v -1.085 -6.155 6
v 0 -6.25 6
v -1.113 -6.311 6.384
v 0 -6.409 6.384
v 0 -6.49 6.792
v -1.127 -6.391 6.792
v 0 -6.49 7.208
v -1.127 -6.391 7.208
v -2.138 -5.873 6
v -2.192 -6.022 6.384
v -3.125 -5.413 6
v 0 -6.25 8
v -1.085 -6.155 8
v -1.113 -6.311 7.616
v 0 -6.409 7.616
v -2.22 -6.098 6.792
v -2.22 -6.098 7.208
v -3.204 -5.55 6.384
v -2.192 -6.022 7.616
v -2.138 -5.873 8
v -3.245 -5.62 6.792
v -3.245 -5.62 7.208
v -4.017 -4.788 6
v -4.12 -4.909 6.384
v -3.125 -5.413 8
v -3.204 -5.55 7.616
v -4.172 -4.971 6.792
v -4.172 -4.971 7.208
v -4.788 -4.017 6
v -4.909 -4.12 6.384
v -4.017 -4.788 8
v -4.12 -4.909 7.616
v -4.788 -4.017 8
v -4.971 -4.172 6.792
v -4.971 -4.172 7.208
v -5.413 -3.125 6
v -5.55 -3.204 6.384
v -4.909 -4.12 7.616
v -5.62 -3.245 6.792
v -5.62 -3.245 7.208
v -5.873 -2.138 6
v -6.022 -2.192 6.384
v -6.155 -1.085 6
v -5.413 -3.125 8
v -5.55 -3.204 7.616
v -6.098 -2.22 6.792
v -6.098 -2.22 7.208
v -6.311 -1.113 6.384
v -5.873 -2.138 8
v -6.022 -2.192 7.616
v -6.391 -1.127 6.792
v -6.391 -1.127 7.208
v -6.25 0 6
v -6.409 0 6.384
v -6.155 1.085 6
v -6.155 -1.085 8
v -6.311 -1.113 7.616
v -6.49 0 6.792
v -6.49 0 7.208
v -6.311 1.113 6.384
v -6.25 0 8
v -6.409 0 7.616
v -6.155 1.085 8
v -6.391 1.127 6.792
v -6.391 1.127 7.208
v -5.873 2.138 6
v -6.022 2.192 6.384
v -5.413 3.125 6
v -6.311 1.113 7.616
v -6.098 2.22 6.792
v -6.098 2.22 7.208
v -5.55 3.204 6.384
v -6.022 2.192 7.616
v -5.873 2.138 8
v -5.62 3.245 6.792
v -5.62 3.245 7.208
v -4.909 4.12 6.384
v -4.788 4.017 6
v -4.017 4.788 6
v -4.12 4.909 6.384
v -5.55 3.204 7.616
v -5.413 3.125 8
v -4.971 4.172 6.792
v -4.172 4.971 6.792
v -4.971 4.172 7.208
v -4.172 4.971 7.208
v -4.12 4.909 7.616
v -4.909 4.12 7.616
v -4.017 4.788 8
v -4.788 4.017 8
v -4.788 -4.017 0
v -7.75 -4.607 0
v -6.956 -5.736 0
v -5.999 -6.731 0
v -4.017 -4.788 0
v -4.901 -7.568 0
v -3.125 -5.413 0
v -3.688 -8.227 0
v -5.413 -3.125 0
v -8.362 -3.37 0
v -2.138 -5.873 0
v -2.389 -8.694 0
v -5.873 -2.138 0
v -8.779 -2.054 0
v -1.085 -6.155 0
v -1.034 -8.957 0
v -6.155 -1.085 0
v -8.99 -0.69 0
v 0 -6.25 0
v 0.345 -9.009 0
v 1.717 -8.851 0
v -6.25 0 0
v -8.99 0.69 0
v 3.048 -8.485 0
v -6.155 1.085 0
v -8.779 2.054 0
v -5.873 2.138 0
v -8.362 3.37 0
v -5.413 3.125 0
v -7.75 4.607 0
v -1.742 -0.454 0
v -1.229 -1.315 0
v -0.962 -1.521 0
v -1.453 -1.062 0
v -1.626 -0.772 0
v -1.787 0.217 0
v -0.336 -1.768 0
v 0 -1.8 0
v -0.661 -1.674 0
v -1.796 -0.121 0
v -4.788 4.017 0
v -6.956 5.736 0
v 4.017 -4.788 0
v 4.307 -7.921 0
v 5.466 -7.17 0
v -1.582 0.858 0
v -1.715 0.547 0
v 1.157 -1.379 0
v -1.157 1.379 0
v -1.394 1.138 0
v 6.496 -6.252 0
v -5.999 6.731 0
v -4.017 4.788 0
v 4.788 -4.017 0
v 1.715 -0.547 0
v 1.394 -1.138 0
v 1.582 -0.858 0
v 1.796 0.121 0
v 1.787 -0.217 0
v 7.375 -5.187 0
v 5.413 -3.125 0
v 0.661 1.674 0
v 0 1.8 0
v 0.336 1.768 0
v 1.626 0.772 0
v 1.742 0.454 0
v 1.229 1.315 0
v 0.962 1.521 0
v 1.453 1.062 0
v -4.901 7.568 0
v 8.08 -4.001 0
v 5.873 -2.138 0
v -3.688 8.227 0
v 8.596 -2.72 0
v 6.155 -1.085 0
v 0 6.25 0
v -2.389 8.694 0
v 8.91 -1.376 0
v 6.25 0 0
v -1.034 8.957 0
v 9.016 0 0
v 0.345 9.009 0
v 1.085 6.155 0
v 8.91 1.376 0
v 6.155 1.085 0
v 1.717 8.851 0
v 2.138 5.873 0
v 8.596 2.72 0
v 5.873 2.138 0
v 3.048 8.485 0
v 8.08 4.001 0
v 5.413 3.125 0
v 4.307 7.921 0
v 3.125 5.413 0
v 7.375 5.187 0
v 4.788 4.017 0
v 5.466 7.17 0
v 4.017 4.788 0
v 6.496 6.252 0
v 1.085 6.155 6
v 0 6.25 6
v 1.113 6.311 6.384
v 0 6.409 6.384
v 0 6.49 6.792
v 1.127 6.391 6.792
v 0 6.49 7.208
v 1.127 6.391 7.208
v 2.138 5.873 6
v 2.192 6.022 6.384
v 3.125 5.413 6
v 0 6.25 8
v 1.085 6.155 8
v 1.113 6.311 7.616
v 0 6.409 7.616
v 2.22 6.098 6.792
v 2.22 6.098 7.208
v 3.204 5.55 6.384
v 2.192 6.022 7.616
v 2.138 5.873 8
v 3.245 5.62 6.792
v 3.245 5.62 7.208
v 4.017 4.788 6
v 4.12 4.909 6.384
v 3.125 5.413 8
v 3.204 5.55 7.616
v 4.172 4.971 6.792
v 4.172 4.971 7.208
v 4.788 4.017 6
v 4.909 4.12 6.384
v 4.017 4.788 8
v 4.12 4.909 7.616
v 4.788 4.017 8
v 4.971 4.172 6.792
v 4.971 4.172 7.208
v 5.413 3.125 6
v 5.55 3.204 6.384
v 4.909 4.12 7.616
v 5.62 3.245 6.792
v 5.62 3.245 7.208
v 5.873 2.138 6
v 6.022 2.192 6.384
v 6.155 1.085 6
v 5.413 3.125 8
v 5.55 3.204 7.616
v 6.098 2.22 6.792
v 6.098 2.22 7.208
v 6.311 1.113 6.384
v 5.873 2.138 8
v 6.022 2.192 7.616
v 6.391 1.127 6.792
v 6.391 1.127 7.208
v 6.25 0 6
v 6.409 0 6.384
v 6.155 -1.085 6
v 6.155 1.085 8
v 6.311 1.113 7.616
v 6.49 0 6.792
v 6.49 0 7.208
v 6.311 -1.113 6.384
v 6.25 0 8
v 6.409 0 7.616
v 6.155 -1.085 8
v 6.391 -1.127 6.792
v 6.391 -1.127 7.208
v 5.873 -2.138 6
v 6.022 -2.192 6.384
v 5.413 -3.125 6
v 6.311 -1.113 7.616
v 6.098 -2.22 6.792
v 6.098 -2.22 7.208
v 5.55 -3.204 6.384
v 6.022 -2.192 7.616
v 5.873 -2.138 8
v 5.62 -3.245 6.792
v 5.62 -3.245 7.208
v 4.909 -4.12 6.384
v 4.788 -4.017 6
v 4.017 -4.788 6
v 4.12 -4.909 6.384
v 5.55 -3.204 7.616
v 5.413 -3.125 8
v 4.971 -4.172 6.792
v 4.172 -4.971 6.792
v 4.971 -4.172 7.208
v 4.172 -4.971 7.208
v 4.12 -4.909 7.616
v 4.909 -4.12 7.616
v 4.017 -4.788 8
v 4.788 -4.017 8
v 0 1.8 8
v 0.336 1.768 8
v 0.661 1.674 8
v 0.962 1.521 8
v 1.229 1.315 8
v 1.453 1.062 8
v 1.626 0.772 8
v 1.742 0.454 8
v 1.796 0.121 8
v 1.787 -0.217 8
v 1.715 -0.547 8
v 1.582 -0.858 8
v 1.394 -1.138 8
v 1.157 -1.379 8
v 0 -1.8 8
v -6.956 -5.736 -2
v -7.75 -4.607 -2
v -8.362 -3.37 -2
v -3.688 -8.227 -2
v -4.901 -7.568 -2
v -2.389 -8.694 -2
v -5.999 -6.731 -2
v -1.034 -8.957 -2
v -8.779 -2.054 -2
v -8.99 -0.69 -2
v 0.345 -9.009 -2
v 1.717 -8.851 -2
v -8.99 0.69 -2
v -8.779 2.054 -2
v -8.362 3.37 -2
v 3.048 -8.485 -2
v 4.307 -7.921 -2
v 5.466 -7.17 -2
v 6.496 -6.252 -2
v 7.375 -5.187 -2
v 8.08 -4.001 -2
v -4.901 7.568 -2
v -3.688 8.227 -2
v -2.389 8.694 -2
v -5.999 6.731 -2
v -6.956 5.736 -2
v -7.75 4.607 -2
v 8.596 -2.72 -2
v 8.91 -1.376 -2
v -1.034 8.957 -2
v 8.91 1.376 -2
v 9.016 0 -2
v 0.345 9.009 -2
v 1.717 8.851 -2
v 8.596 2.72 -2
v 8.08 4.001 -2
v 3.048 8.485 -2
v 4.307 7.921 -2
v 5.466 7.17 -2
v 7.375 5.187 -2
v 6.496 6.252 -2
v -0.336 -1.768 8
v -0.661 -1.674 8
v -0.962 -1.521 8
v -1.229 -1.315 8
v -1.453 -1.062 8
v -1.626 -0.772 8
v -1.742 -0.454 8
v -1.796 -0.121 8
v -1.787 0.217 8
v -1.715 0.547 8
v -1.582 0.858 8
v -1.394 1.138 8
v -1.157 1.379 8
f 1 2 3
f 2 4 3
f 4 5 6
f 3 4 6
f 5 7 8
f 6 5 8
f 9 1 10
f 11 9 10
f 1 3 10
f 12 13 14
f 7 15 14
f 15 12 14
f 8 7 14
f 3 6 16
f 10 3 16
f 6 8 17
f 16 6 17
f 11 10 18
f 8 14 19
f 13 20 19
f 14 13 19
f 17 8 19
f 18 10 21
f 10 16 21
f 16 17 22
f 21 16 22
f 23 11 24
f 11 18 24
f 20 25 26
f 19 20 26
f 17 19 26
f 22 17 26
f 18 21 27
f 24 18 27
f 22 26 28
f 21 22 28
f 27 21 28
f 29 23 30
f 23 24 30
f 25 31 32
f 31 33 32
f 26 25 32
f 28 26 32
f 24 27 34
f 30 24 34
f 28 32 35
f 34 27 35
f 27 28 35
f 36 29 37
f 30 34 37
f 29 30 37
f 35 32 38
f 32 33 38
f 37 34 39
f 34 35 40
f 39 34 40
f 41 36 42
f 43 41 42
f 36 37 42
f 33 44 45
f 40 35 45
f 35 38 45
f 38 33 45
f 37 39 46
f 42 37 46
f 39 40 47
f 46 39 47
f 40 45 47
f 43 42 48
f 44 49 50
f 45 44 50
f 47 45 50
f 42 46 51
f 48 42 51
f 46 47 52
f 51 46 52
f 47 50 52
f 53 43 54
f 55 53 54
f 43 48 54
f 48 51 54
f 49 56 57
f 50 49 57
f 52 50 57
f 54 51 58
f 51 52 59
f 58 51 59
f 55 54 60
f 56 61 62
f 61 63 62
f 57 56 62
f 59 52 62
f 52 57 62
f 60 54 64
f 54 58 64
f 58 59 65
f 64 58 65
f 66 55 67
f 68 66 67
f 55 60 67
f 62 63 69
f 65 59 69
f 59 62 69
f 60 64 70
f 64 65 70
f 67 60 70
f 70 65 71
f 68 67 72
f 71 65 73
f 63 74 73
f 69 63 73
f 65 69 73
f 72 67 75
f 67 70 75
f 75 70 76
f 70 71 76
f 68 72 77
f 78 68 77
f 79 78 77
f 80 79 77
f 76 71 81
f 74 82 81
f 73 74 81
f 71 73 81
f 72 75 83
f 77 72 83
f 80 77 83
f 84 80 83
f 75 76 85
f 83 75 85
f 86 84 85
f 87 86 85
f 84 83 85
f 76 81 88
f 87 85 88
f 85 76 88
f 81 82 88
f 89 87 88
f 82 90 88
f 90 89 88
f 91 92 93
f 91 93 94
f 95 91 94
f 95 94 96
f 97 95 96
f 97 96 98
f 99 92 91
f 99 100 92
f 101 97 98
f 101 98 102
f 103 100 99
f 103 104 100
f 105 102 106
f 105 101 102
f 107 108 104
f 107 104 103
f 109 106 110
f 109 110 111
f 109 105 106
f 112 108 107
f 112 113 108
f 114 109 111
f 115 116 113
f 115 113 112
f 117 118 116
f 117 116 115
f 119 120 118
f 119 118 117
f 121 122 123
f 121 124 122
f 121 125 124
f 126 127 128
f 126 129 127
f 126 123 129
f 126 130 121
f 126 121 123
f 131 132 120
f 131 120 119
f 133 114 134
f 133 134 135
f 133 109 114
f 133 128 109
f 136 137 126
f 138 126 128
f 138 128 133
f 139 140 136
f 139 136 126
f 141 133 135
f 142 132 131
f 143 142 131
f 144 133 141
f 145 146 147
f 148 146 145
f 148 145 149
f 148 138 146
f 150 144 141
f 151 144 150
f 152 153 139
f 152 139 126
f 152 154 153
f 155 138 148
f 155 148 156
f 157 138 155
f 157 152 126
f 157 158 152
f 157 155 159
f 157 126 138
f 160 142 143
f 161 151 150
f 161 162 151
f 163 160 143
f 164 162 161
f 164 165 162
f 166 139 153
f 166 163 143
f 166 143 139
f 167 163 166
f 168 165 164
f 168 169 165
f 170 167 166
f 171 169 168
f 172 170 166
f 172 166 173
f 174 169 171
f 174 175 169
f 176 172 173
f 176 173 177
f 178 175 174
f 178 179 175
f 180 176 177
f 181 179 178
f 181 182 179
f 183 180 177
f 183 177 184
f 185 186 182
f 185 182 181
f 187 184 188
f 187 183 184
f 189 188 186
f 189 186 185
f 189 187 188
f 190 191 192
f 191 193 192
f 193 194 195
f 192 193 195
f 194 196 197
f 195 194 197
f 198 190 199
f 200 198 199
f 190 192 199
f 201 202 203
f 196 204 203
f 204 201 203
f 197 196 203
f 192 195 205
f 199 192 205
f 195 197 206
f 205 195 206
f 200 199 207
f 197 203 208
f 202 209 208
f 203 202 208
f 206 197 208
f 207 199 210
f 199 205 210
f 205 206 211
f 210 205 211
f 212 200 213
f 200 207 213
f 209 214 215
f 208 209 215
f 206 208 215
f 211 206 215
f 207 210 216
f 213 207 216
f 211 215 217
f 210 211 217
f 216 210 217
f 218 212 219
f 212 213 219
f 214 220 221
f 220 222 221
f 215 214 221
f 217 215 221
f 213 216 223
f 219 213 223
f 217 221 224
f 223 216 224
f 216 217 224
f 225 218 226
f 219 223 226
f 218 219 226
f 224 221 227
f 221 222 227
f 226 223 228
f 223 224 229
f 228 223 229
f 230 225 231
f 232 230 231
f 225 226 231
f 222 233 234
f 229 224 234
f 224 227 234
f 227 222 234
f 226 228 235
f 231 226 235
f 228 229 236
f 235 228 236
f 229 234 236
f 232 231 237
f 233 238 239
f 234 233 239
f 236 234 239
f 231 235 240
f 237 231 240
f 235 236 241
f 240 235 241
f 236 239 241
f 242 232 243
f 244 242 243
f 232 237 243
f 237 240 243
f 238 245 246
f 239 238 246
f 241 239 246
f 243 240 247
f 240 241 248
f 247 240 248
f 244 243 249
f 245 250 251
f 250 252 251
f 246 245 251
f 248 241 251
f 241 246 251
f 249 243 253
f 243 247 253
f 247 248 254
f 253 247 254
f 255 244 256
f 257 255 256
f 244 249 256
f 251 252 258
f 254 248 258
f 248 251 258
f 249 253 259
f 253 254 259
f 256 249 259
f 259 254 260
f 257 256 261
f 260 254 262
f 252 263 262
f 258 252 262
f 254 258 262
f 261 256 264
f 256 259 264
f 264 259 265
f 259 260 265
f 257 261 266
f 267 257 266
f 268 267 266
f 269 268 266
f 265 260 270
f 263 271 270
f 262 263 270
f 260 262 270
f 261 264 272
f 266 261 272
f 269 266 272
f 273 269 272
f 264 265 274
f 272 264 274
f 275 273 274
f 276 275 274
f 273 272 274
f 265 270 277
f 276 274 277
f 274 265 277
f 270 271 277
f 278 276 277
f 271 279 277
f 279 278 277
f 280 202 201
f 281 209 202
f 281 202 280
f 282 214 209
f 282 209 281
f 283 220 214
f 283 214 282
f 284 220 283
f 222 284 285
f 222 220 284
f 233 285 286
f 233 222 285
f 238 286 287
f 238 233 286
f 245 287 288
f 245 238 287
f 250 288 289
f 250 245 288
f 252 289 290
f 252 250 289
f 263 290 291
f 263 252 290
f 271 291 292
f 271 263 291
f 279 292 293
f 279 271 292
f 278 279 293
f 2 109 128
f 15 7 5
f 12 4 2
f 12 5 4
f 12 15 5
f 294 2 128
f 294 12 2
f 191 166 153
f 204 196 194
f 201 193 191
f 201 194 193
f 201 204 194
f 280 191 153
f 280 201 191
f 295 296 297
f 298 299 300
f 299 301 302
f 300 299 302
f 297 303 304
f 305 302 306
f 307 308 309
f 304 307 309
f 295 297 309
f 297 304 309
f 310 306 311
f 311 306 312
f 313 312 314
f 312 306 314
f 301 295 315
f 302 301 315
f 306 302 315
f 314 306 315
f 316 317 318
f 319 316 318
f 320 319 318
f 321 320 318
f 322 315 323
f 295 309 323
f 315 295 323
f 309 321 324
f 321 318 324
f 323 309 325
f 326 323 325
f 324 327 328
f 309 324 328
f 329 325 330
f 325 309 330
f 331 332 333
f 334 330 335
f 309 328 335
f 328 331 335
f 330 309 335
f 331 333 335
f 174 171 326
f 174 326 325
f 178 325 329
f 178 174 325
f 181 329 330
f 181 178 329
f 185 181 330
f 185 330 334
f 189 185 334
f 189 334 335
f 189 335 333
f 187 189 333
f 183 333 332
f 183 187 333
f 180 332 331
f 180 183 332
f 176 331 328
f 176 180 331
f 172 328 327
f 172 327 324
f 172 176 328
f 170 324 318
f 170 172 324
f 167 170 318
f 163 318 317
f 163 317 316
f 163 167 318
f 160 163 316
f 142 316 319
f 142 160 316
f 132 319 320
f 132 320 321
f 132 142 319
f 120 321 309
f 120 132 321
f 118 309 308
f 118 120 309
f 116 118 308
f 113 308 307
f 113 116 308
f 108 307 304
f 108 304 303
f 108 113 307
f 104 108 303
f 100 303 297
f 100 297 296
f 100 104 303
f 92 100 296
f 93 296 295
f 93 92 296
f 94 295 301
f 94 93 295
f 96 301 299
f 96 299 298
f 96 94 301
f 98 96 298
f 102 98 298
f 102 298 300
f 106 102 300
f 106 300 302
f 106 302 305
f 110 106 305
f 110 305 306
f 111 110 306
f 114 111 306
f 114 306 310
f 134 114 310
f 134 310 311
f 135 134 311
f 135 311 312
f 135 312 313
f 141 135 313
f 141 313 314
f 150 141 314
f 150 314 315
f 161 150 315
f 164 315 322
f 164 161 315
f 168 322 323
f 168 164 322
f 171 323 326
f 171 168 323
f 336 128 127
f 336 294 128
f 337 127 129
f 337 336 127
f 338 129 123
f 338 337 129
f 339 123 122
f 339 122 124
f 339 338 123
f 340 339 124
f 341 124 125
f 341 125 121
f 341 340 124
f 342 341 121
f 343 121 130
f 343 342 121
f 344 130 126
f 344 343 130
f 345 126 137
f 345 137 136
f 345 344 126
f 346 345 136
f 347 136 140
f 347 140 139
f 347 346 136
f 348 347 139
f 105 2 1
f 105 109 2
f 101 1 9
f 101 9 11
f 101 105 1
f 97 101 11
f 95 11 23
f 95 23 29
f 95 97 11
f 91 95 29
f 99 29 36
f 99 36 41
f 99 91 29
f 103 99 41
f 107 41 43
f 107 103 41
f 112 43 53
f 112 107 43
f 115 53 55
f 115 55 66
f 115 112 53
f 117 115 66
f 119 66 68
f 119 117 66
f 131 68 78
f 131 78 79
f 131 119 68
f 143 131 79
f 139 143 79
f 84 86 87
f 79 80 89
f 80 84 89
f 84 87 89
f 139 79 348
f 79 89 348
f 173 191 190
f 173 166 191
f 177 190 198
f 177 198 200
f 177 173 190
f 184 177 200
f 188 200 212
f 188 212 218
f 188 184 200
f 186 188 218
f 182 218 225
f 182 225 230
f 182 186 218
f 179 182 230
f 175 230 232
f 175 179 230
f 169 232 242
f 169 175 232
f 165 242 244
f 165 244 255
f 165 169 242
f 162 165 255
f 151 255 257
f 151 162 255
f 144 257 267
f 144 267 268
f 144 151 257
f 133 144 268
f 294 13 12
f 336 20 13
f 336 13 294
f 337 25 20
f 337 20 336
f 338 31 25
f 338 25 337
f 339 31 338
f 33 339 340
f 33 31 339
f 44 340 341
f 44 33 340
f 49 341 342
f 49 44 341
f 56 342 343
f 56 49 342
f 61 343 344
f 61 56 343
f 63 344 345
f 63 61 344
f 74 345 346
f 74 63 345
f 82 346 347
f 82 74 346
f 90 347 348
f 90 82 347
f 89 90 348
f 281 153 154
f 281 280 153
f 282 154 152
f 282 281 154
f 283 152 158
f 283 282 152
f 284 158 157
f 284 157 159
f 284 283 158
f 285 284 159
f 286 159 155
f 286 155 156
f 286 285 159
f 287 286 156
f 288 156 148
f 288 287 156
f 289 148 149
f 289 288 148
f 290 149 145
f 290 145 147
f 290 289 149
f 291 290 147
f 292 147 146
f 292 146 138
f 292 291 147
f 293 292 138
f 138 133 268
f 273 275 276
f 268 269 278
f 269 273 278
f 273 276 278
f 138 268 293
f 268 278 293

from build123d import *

# Parameters (mm, degrees)
SKETCH016_R           = 9.016071
PAD004_DEPTH          = 2
REVOLUTION003_ANGLE   = -140
POLARPATTERN001_COUNT = 2


with BuildPart() as part:
    # Sketch016 → Pad004 (new body)
    with BuildSketch(Plane.XY):
        Circle(SKETCH016_R)
    extrude(amount=-PAD004_DEPTH)

    # Sketch018 → Revolution003 (revolve)
    with BuildSketch(Plane.YZ):
        with BuildLine():
            Line((1.8, 0), (1.8, 8))
            Line((1.8, 8), (6.25, 8))
            ThreePointArc((6.25, 6), (6.5, 7), (6.25, 8))
            Line((6.25, 6), (6.25, 0))
            Line((6.25, 0), (1.8, 0))
        make_face()
    revolution003 = revolve(axis=Axis((0, 0, 0), (0, 0, 1)), revolution_arc=REVOLUTION003_ANGLE)

    # PolarPattern001: Revolution003 ×2 about axis
    polarpattern001_axis = Axis((0, 0, 0), (0, 0, 1))
    for i in range(1, POLARPATTERN001_COUNT):
        add(revolution003.rotate(polarpattern001_axis, i * 360 / POLARPATTERN001_COUNT))


solid = part.part
